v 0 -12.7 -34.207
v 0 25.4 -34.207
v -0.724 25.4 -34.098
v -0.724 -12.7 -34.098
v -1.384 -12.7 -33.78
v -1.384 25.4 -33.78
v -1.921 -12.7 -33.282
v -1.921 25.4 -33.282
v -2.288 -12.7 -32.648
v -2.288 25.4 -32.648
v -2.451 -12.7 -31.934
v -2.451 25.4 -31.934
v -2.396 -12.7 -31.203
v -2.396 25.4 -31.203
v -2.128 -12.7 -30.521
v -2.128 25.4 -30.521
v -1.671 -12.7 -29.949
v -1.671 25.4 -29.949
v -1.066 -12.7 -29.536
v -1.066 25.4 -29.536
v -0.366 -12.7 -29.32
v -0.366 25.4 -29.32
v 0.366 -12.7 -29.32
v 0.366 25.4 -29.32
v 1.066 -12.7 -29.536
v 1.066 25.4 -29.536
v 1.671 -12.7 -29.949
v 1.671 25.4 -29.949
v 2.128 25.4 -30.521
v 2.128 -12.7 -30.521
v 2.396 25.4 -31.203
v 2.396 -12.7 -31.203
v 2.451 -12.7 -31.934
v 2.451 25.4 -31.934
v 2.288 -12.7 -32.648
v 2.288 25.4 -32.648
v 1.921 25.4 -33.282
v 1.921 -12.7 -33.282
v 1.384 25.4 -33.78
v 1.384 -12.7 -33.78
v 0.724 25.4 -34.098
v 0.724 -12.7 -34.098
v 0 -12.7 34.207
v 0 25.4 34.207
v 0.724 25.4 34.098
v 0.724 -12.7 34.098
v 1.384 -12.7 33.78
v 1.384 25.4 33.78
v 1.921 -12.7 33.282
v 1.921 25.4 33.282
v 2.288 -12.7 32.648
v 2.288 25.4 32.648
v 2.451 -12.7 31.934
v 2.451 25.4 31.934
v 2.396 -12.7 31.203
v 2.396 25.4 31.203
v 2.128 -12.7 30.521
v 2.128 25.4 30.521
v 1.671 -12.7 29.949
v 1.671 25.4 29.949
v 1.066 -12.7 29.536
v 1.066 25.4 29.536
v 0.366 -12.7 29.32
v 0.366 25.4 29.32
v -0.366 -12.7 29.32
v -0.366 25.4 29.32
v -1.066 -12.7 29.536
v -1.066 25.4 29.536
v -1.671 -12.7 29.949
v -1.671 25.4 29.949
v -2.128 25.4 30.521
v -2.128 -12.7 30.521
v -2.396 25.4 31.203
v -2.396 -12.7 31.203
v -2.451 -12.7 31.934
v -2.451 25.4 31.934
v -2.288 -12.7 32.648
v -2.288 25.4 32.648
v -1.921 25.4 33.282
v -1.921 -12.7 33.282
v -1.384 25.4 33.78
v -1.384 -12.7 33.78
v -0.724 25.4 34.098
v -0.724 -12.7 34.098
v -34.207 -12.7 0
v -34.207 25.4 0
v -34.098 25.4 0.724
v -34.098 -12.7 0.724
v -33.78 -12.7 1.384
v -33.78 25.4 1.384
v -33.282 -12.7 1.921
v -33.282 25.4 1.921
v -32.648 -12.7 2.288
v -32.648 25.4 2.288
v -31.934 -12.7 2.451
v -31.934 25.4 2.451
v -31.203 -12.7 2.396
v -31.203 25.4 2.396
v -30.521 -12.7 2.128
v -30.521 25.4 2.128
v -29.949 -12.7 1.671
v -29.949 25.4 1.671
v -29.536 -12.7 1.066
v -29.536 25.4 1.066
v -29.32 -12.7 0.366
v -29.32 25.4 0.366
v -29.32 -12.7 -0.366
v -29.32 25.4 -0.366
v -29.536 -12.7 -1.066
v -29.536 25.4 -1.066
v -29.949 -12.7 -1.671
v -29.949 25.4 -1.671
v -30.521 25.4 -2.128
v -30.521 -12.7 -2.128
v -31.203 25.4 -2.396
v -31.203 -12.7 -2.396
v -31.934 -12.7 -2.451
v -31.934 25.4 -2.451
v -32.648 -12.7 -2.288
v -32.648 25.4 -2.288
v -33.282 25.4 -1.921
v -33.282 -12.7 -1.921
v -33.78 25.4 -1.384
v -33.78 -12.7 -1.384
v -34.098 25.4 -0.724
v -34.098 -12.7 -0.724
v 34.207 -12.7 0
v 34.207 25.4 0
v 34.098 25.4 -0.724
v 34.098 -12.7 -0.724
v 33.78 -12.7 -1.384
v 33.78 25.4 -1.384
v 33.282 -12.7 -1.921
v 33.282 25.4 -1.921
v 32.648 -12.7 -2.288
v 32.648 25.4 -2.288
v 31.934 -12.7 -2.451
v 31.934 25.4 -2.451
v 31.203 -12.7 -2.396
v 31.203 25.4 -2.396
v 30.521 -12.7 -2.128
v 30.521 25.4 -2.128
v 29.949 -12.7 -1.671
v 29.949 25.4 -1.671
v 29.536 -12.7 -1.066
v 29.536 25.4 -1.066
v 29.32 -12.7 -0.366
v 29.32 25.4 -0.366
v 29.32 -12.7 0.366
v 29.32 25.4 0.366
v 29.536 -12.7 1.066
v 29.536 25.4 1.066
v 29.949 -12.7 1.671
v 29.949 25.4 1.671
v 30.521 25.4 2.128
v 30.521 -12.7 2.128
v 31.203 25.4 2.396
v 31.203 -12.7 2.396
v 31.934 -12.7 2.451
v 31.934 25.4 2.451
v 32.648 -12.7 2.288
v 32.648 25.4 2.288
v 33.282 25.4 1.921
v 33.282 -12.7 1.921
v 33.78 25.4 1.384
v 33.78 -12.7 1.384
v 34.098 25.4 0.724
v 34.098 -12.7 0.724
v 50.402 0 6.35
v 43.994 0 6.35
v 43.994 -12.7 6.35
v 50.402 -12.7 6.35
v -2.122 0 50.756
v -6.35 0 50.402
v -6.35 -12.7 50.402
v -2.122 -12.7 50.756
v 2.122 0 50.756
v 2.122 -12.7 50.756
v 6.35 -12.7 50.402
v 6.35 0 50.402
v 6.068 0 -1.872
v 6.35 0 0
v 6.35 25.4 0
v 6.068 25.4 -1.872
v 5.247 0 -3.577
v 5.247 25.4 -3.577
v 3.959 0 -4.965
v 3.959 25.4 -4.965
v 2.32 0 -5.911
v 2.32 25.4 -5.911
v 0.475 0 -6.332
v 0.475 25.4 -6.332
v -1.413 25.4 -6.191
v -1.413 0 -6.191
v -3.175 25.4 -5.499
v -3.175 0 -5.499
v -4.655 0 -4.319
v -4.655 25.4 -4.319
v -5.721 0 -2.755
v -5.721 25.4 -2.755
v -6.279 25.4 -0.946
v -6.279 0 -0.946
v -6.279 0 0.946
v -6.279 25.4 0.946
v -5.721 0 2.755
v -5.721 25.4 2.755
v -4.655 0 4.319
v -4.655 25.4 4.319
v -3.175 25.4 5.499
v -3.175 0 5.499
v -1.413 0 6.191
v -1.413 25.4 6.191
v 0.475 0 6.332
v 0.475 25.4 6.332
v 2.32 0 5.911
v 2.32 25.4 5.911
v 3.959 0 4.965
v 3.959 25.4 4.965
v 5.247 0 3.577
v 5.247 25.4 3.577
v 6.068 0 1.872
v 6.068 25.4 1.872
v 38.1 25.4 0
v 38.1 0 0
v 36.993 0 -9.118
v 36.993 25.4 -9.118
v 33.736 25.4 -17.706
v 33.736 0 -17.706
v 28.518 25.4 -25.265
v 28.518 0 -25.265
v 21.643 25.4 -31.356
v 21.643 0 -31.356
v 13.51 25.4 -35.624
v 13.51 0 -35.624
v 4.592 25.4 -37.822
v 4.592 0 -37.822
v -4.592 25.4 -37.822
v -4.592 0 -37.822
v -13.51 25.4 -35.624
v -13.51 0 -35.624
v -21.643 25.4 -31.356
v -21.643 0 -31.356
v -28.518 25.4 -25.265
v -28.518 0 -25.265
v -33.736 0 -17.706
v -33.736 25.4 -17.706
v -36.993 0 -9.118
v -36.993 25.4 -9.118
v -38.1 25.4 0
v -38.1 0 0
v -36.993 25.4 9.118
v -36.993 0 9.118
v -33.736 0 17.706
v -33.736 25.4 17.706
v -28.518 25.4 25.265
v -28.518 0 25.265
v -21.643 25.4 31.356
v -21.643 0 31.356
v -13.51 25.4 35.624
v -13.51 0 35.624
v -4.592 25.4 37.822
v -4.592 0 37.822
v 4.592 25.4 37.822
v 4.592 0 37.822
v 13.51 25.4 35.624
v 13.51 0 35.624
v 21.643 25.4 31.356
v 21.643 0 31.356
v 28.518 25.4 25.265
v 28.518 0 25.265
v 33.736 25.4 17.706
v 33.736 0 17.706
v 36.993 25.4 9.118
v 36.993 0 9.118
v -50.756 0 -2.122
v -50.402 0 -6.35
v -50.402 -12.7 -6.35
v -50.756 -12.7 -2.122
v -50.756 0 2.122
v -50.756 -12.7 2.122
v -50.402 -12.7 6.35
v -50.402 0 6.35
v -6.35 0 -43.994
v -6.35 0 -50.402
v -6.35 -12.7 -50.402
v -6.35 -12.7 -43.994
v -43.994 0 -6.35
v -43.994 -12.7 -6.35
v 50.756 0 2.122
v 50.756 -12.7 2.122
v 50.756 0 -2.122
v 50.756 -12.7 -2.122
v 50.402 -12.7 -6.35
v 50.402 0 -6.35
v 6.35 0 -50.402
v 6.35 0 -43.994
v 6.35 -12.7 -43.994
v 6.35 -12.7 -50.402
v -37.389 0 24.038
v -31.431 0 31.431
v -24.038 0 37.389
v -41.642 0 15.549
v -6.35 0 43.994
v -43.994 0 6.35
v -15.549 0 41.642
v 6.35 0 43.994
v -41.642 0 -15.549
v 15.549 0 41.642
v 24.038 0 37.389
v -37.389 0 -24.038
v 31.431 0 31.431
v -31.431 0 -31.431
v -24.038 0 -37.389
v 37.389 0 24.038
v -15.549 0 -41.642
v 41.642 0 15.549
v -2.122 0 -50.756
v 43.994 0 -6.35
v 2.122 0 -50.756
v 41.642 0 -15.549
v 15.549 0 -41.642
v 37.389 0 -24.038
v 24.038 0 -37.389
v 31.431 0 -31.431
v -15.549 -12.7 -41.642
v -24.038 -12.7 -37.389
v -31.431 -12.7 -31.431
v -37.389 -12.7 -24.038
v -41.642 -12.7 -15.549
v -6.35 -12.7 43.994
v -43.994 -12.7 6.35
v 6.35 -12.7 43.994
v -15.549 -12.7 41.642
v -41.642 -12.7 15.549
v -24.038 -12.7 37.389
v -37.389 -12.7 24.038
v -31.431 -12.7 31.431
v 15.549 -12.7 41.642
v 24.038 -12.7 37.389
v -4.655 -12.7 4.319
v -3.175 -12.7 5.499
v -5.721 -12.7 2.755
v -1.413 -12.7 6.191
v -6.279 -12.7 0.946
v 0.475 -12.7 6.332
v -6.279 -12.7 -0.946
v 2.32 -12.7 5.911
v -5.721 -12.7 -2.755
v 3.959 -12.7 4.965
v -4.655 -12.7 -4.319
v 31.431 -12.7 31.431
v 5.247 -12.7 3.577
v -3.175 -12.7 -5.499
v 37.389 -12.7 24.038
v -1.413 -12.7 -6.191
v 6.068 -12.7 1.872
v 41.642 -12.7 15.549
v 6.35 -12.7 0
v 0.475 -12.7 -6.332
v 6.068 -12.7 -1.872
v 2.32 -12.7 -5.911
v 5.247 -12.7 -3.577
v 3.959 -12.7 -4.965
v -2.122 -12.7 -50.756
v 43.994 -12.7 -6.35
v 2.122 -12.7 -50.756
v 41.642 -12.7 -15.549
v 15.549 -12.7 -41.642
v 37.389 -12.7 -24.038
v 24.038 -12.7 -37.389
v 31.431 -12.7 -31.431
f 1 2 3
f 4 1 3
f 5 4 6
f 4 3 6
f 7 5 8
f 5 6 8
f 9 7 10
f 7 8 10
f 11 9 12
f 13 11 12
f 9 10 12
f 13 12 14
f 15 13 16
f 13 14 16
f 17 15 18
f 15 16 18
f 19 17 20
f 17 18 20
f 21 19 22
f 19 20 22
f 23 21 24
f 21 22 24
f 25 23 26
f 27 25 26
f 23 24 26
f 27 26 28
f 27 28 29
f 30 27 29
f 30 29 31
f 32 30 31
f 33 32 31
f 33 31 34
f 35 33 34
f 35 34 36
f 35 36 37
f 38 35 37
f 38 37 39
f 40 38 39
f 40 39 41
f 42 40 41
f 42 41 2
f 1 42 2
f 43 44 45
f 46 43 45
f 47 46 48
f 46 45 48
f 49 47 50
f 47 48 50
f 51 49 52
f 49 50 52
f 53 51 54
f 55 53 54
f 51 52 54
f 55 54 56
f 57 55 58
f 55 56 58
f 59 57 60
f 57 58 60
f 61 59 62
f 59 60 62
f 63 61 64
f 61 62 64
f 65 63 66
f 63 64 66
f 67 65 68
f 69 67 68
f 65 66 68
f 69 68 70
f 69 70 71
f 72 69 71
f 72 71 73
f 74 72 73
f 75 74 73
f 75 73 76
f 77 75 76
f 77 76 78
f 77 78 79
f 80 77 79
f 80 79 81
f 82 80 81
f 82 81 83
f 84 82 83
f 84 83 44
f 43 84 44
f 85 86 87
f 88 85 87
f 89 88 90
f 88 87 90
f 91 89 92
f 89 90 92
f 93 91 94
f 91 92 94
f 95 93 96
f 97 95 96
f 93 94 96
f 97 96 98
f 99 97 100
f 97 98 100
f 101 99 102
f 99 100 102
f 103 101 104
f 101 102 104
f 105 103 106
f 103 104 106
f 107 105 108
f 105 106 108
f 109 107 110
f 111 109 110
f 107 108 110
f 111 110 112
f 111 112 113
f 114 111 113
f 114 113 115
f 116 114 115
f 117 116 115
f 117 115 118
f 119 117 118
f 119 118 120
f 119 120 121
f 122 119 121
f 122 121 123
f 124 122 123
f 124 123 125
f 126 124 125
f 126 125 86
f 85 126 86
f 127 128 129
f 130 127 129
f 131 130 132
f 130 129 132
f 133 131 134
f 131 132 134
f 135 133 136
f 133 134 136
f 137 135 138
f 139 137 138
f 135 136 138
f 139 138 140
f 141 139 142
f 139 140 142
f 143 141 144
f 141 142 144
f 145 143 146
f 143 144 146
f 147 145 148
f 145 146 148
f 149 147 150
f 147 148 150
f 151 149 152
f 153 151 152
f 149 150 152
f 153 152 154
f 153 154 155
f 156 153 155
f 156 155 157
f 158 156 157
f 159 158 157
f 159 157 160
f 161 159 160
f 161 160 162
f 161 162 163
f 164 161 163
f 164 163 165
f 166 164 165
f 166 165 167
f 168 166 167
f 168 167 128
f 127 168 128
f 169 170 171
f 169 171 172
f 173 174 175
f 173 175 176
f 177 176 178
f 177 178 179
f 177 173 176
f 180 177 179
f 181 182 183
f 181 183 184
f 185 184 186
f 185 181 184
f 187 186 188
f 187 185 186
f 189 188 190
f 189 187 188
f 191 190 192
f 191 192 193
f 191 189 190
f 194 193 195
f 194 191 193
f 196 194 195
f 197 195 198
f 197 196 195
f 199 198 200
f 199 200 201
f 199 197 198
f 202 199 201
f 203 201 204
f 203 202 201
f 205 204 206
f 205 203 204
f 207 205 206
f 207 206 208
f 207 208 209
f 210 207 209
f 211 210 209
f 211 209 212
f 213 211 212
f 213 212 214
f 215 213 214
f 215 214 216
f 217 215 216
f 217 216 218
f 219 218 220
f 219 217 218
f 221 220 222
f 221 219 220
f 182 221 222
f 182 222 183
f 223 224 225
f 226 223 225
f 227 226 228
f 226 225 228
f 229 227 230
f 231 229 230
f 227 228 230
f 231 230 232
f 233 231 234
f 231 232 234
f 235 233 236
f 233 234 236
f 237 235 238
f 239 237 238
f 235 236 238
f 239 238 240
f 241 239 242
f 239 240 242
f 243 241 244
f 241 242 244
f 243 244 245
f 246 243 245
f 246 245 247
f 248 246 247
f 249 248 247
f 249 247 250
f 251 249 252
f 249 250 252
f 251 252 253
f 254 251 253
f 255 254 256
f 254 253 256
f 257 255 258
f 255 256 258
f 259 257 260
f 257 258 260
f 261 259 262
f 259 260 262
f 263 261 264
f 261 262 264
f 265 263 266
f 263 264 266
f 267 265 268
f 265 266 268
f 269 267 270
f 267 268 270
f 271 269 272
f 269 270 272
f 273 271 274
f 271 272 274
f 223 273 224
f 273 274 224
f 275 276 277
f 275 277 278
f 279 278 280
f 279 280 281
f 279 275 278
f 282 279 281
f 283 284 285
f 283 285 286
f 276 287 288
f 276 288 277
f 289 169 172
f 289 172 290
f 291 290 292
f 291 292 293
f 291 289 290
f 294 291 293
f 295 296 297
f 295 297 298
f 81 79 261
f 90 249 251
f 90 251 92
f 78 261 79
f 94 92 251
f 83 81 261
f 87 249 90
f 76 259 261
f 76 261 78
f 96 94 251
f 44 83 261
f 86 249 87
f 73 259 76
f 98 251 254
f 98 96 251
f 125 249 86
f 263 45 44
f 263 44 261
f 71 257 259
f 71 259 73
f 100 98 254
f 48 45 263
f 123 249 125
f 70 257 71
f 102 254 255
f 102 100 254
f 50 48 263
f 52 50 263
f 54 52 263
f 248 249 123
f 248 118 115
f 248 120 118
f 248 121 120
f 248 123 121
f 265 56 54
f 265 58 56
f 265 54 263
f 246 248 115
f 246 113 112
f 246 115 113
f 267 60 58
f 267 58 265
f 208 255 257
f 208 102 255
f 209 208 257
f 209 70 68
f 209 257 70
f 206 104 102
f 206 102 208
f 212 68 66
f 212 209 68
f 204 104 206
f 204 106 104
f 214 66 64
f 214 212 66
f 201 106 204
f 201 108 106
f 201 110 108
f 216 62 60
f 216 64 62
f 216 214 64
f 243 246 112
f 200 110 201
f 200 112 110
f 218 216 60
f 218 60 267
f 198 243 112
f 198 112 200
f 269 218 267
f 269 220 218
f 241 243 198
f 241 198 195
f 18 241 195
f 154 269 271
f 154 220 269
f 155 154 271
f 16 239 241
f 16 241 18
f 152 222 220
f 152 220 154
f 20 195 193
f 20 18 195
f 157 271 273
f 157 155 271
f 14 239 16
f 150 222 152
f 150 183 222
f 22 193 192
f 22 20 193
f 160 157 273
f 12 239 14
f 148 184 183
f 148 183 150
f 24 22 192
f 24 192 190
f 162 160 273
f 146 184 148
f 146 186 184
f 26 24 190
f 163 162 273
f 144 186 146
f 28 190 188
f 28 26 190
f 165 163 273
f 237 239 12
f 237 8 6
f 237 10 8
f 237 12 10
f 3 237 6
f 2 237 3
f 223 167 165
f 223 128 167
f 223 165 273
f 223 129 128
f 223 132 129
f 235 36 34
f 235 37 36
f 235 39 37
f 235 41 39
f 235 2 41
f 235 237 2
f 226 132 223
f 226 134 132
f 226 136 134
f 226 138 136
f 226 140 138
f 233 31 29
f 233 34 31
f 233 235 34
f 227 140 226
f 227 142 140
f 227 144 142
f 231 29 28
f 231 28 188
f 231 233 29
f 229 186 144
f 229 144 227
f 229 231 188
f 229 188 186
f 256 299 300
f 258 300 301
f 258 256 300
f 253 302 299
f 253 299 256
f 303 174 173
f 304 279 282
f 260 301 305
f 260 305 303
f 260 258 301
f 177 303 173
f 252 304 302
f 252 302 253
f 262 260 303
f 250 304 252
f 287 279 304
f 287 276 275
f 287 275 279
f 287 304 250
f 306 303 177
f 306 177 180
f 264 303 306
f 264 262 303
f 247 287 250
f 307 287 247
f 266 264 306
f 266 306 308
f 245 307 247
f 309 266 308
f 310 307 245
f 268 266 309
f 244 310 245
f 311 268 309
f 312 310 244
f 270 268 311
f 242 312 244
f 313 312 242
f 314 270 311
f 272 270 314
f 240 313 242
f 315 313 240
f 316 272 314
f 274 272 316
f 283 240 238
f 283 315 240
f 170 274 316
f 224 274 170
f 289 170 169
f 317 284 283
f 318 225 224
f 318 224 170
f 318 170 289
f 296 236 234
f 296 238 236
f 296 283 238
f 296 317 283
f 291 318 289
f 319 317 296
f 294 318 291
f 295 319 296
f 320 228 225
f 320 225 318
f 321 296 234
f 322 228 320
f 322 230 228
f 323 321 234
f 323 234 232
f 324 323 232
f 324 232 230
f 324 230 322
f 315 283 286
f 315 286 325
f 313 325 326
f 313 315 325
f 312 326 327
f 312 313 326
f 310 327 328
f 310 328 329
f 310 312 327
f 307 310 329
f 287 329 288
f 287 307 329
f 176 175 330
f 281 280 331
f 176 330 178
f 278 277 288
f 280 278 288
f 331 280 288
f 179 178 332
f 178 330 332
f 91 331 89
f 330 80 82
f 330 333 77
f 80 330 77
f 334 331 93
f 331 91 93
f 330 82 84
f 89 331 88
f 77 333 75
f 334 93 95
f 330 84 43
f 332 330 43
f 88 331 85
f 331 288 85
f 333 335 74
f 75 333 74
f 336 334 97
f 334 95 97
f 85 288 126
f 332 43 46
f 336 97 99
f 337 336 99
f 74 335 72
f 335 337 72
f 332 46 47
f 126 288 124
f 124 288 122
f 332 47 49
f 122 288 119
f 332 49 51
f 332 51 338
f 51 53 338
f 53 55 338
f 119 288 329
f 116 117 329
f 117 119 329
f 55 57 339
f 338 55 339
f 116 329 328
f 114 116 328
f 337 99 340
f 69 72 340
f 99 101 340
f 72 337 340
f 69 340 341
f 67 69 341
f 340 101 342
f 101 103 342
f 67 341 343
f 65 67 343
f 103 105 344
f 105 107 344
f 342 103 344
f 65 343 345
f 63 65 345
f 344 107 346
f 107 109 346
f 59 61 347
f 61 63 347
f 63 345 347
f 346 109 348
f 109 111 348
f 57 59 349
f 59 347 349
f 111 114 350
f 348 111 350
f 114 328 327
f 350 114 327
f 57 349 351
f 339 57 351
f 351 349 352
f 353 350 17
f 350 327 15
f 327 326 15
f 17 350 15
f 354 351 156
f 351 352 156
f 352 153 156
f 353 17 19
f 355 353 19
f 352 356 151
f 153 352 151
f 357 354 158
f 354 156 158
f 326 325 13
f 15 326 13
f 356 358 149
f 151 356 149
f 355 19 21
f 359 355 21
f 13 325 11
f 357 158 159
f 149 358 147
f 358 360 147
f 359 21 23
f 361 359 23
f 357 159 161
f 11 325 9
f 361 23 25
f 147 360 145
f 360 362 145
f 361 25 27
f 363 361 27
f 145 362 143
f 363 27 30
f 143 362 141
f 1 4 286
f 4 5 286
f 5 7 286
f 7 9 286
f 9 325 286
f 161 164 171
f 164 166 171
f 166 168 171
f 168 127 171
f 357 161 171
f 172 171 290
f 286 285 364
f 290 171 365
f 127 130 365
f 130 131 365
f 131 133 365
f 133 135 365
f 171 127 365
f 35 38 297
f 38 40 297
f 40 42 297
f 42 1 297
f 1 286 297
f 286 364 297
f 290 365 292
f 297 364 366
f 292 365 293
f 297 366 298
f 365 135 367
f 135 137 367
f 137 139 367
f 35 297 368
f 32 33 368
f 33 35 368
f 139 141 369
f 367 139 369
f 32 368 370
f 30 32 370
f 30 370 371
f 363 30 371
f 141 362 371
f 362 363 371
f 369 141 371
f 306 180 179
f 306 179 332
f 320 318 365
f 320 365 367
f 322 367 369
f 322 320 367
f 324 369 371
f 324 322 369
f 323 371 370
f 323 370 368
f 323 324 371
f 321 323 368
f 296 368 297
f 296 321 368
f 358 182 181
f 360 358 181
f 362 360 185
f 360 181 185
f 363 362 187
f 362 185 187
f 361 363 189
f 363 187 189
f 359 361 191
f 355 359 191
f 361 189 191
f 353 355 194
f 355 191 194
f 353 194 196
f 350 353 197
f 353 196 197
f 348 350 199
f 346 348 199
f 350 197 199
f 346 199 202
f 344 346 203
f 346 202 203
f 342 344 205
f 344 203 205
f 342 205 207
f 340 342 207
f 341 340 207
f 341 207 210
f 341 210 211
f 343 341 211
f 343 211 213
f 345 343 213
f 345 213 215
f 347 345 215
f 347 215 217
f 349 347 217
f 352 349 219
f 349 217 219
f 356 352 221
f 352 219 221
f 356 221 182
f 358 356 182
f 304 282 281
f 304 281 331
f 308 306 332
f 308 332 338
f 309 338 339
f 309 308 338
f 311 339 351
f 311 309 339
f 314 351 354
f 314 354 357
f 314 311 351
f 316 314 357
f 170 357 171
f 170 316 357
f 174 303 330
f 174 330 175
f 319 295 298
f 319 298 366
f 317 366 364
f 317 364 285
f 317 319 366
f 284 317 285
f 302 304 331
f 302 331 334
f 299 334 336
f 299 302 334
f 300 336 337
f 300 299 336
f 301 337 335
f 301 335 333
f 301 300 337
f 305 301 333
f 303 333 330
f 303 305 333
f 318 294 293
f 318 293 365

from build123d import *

# Parameters (mm, degrees)
SKETCH2_R                    = 38.1
SKETCH2_R_2                  = 6.35
BOSS_EXTRUDE2_DEPTH          = 25.4
BOSS_EXTRUDE3_START          = -12.7
SKETCH2_5_R                  = 6.35
BOSS_EXTRUDE3_DEPTH          = 12.7
F_10_0_1935_DIAMETER_HOLE2_D = 4.9149
CIRPATTERN2_COUNT            = 4


with BuildPart() as part:
    # Sketch2 → Boss-Extrude2 (new body)
    with BuildSketch(Plane(origin=(0, 0, 0), x_dir=(1, 0, 0), z_dir=(0, 1, 0))):
        Circle(SKETCH2_R)
        Circle(SKETCH2_R_2, mode=Mode.SUBTRACT)
    extrude(amount=BOSS_EXTRUDE2_DEPTH)

    # Sketch2<5> → Boss-Extrude3 (add)
    with BuildSketch(Plane(origin=(0, 0, 0), x_dir=(1, 0, 0), z_dir=(0, 1, 0)).offset(BOSS_EXTRUDE3_START)):
        with BuildLine():
            Line((-6.35, 50.401562476), (-6.35, 43.994090512))
            ThreePointArc((-6.35, 43.994090512), (-31.430896424, 31.430896424), (-43.994090512, 6.35))
            Line((-43.994090512, 6.35), (-50.401562476, 6.35))
            ThreePointArc((-50.401562476, 6.35), (-50.8, 0), (-50.401562476, -6.35))
            Line((-50.401562476, -6.35), (-43.994090512, -6.35))
            ThreePointArc((-43.994090512, -6.35), (-31.430896424, -31.430896424), (-6.35, -43.994090512))
            Line((-6.35, -43.994090512), (-6.35, -50.401562476))
            ThreePointArc((-6.35, -50.401562476), (0, -50.8), (6.35, -50.401562476))
            Line((6.35, -50.401562476), (6.35, -43.994090512))
            ThreePointArc((6.35, -43.994090512), (31.430896424, -31.430896424), (43.994090512, -6.35))
            Line((43.994090512, -6.35), (50.401562476, -6.35))
            ThreePointArc((50.401562476, -6.35), (50.8, 0), (50.401562476, 6.35))
            Line((50.401562476, 6.35), (43.994090512, 6.35))
            ThreePointArc((43.994090512, 6.35), (31.430896424, 31.430896424), (6.35, 43.994090512))
            Line((6.35, 43.994090512), (6.35, 50.401562476))
            ThreePointArc((6.35, 50.401562476), (0, 50.8), (-6.35, 50.401562476))
        make_face()
        Circle(SKETCH2_5_R, mode=Mode.SUBTRACT)
    extrude(amount=BOSS_EXTRUDE3_DEPTH)

    # #10 (0.1935) Diameter Hole2 (through all)
    with Locations(Plane(origin=(0, -12.7, 31.75), x_dir=(0, 0, -1), z_dir=(0, -1, 0))):
        with Locations((0, 0)):
            f_10_0_1935_diameter_hole2 = Hole(F_10_0_1935_DIAMETER_HOLE2_D / 2)

    # CirPattern2: #10 (0.1935) Diameter Hole2 ×4 about axis
    cirpattern2_axis = Axis((0, 25.4, 0), (0, -1, 0))
    for i in range(1, CIRPATTERN2_COUNT):
        add(f_10_0_1935_diameter_hole2.rotate(cirpattern2_axis, i * 360 / CIRPATTERN2_COUNT), mode=Mode.SUBTRACT)


solid = part.part
